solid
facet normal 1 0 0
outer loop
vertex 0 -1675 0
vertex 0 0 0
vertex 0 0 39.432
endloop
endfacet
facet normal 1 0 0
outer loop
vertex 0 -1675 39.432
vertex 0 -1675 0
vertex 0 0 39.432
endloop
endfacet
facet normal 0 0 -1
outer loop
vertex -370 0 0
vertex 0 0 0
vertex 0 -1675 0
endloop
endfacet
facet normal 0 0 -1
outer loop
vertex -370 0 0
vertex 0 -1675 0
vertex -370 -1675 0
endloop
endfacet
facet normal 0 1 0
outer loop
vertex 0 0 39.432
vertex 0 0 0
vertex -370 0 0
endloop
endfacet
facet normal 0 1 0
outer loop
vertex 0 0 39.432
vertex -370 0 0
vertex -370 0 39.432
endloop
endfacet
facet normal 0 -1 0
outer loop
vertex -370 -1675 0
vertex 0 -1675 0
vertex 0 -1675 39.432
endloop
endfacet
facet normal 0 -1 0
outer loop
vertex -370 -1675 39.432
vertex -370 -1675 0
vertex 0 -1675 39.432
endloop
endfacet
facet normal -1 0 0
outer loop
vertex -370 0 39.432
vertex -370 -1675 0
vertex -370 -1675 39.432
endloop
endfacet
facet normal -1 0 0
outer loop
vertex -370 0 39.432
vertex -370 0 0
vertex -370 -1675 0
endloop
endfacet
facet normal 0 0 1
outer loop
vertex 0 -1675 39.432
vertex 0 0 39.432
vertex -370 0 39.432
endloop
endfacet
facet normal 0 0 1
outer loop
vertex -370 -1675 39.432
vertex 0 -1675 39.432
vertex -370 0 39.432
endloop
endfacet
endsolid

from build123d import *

# Parameters (mm, degrees)
F0_W     = 48.4505593777
F0_H     = 39.4315421581
F1_DEPTH = 600
F2_DEPTH = 1700
F3_DEPTH = 25
F4_DEPTH = 230


with BuildPart() as f1:
    # F0 (on Right) → F1 (new body)
    with BuildSketch(Plane.YZ):
        with Locations((-24.2252796888, 19.7157710791)):
            Rectangle(F0_W, F0_H)
    extrude(amount=-F1_DEPTH)

    # F2 (add): a face of the model
    f2_faces = [f1.faces().sort_by_distance(p)[0] for p in [
        (-300, 0, 19.7157710791),
    ]]
    extrude(f2_faces, amount=-F2_DEPTH)

    # F3 (cut): a face of the model
    f3_faces = [f1.faces().sort_by_distance(p)[0] for p in [
        (-300, -1700, 19.7157710791),
    ]]
    extrude(f3_faces, amount=-F3_DEPTH, mode=Mode.SUBTRACT)

    # F4 (cut): a face of the model
    f4_faces = [f1.faces().sort_by_distance(p)[0] for p in [
        (-600, -837.5, 19.7157710791),
    ]]
    extrude(f4_faces, amount=-F4_DEPTH, mode=Mode.SUBTRACT)


solid = f1.part
